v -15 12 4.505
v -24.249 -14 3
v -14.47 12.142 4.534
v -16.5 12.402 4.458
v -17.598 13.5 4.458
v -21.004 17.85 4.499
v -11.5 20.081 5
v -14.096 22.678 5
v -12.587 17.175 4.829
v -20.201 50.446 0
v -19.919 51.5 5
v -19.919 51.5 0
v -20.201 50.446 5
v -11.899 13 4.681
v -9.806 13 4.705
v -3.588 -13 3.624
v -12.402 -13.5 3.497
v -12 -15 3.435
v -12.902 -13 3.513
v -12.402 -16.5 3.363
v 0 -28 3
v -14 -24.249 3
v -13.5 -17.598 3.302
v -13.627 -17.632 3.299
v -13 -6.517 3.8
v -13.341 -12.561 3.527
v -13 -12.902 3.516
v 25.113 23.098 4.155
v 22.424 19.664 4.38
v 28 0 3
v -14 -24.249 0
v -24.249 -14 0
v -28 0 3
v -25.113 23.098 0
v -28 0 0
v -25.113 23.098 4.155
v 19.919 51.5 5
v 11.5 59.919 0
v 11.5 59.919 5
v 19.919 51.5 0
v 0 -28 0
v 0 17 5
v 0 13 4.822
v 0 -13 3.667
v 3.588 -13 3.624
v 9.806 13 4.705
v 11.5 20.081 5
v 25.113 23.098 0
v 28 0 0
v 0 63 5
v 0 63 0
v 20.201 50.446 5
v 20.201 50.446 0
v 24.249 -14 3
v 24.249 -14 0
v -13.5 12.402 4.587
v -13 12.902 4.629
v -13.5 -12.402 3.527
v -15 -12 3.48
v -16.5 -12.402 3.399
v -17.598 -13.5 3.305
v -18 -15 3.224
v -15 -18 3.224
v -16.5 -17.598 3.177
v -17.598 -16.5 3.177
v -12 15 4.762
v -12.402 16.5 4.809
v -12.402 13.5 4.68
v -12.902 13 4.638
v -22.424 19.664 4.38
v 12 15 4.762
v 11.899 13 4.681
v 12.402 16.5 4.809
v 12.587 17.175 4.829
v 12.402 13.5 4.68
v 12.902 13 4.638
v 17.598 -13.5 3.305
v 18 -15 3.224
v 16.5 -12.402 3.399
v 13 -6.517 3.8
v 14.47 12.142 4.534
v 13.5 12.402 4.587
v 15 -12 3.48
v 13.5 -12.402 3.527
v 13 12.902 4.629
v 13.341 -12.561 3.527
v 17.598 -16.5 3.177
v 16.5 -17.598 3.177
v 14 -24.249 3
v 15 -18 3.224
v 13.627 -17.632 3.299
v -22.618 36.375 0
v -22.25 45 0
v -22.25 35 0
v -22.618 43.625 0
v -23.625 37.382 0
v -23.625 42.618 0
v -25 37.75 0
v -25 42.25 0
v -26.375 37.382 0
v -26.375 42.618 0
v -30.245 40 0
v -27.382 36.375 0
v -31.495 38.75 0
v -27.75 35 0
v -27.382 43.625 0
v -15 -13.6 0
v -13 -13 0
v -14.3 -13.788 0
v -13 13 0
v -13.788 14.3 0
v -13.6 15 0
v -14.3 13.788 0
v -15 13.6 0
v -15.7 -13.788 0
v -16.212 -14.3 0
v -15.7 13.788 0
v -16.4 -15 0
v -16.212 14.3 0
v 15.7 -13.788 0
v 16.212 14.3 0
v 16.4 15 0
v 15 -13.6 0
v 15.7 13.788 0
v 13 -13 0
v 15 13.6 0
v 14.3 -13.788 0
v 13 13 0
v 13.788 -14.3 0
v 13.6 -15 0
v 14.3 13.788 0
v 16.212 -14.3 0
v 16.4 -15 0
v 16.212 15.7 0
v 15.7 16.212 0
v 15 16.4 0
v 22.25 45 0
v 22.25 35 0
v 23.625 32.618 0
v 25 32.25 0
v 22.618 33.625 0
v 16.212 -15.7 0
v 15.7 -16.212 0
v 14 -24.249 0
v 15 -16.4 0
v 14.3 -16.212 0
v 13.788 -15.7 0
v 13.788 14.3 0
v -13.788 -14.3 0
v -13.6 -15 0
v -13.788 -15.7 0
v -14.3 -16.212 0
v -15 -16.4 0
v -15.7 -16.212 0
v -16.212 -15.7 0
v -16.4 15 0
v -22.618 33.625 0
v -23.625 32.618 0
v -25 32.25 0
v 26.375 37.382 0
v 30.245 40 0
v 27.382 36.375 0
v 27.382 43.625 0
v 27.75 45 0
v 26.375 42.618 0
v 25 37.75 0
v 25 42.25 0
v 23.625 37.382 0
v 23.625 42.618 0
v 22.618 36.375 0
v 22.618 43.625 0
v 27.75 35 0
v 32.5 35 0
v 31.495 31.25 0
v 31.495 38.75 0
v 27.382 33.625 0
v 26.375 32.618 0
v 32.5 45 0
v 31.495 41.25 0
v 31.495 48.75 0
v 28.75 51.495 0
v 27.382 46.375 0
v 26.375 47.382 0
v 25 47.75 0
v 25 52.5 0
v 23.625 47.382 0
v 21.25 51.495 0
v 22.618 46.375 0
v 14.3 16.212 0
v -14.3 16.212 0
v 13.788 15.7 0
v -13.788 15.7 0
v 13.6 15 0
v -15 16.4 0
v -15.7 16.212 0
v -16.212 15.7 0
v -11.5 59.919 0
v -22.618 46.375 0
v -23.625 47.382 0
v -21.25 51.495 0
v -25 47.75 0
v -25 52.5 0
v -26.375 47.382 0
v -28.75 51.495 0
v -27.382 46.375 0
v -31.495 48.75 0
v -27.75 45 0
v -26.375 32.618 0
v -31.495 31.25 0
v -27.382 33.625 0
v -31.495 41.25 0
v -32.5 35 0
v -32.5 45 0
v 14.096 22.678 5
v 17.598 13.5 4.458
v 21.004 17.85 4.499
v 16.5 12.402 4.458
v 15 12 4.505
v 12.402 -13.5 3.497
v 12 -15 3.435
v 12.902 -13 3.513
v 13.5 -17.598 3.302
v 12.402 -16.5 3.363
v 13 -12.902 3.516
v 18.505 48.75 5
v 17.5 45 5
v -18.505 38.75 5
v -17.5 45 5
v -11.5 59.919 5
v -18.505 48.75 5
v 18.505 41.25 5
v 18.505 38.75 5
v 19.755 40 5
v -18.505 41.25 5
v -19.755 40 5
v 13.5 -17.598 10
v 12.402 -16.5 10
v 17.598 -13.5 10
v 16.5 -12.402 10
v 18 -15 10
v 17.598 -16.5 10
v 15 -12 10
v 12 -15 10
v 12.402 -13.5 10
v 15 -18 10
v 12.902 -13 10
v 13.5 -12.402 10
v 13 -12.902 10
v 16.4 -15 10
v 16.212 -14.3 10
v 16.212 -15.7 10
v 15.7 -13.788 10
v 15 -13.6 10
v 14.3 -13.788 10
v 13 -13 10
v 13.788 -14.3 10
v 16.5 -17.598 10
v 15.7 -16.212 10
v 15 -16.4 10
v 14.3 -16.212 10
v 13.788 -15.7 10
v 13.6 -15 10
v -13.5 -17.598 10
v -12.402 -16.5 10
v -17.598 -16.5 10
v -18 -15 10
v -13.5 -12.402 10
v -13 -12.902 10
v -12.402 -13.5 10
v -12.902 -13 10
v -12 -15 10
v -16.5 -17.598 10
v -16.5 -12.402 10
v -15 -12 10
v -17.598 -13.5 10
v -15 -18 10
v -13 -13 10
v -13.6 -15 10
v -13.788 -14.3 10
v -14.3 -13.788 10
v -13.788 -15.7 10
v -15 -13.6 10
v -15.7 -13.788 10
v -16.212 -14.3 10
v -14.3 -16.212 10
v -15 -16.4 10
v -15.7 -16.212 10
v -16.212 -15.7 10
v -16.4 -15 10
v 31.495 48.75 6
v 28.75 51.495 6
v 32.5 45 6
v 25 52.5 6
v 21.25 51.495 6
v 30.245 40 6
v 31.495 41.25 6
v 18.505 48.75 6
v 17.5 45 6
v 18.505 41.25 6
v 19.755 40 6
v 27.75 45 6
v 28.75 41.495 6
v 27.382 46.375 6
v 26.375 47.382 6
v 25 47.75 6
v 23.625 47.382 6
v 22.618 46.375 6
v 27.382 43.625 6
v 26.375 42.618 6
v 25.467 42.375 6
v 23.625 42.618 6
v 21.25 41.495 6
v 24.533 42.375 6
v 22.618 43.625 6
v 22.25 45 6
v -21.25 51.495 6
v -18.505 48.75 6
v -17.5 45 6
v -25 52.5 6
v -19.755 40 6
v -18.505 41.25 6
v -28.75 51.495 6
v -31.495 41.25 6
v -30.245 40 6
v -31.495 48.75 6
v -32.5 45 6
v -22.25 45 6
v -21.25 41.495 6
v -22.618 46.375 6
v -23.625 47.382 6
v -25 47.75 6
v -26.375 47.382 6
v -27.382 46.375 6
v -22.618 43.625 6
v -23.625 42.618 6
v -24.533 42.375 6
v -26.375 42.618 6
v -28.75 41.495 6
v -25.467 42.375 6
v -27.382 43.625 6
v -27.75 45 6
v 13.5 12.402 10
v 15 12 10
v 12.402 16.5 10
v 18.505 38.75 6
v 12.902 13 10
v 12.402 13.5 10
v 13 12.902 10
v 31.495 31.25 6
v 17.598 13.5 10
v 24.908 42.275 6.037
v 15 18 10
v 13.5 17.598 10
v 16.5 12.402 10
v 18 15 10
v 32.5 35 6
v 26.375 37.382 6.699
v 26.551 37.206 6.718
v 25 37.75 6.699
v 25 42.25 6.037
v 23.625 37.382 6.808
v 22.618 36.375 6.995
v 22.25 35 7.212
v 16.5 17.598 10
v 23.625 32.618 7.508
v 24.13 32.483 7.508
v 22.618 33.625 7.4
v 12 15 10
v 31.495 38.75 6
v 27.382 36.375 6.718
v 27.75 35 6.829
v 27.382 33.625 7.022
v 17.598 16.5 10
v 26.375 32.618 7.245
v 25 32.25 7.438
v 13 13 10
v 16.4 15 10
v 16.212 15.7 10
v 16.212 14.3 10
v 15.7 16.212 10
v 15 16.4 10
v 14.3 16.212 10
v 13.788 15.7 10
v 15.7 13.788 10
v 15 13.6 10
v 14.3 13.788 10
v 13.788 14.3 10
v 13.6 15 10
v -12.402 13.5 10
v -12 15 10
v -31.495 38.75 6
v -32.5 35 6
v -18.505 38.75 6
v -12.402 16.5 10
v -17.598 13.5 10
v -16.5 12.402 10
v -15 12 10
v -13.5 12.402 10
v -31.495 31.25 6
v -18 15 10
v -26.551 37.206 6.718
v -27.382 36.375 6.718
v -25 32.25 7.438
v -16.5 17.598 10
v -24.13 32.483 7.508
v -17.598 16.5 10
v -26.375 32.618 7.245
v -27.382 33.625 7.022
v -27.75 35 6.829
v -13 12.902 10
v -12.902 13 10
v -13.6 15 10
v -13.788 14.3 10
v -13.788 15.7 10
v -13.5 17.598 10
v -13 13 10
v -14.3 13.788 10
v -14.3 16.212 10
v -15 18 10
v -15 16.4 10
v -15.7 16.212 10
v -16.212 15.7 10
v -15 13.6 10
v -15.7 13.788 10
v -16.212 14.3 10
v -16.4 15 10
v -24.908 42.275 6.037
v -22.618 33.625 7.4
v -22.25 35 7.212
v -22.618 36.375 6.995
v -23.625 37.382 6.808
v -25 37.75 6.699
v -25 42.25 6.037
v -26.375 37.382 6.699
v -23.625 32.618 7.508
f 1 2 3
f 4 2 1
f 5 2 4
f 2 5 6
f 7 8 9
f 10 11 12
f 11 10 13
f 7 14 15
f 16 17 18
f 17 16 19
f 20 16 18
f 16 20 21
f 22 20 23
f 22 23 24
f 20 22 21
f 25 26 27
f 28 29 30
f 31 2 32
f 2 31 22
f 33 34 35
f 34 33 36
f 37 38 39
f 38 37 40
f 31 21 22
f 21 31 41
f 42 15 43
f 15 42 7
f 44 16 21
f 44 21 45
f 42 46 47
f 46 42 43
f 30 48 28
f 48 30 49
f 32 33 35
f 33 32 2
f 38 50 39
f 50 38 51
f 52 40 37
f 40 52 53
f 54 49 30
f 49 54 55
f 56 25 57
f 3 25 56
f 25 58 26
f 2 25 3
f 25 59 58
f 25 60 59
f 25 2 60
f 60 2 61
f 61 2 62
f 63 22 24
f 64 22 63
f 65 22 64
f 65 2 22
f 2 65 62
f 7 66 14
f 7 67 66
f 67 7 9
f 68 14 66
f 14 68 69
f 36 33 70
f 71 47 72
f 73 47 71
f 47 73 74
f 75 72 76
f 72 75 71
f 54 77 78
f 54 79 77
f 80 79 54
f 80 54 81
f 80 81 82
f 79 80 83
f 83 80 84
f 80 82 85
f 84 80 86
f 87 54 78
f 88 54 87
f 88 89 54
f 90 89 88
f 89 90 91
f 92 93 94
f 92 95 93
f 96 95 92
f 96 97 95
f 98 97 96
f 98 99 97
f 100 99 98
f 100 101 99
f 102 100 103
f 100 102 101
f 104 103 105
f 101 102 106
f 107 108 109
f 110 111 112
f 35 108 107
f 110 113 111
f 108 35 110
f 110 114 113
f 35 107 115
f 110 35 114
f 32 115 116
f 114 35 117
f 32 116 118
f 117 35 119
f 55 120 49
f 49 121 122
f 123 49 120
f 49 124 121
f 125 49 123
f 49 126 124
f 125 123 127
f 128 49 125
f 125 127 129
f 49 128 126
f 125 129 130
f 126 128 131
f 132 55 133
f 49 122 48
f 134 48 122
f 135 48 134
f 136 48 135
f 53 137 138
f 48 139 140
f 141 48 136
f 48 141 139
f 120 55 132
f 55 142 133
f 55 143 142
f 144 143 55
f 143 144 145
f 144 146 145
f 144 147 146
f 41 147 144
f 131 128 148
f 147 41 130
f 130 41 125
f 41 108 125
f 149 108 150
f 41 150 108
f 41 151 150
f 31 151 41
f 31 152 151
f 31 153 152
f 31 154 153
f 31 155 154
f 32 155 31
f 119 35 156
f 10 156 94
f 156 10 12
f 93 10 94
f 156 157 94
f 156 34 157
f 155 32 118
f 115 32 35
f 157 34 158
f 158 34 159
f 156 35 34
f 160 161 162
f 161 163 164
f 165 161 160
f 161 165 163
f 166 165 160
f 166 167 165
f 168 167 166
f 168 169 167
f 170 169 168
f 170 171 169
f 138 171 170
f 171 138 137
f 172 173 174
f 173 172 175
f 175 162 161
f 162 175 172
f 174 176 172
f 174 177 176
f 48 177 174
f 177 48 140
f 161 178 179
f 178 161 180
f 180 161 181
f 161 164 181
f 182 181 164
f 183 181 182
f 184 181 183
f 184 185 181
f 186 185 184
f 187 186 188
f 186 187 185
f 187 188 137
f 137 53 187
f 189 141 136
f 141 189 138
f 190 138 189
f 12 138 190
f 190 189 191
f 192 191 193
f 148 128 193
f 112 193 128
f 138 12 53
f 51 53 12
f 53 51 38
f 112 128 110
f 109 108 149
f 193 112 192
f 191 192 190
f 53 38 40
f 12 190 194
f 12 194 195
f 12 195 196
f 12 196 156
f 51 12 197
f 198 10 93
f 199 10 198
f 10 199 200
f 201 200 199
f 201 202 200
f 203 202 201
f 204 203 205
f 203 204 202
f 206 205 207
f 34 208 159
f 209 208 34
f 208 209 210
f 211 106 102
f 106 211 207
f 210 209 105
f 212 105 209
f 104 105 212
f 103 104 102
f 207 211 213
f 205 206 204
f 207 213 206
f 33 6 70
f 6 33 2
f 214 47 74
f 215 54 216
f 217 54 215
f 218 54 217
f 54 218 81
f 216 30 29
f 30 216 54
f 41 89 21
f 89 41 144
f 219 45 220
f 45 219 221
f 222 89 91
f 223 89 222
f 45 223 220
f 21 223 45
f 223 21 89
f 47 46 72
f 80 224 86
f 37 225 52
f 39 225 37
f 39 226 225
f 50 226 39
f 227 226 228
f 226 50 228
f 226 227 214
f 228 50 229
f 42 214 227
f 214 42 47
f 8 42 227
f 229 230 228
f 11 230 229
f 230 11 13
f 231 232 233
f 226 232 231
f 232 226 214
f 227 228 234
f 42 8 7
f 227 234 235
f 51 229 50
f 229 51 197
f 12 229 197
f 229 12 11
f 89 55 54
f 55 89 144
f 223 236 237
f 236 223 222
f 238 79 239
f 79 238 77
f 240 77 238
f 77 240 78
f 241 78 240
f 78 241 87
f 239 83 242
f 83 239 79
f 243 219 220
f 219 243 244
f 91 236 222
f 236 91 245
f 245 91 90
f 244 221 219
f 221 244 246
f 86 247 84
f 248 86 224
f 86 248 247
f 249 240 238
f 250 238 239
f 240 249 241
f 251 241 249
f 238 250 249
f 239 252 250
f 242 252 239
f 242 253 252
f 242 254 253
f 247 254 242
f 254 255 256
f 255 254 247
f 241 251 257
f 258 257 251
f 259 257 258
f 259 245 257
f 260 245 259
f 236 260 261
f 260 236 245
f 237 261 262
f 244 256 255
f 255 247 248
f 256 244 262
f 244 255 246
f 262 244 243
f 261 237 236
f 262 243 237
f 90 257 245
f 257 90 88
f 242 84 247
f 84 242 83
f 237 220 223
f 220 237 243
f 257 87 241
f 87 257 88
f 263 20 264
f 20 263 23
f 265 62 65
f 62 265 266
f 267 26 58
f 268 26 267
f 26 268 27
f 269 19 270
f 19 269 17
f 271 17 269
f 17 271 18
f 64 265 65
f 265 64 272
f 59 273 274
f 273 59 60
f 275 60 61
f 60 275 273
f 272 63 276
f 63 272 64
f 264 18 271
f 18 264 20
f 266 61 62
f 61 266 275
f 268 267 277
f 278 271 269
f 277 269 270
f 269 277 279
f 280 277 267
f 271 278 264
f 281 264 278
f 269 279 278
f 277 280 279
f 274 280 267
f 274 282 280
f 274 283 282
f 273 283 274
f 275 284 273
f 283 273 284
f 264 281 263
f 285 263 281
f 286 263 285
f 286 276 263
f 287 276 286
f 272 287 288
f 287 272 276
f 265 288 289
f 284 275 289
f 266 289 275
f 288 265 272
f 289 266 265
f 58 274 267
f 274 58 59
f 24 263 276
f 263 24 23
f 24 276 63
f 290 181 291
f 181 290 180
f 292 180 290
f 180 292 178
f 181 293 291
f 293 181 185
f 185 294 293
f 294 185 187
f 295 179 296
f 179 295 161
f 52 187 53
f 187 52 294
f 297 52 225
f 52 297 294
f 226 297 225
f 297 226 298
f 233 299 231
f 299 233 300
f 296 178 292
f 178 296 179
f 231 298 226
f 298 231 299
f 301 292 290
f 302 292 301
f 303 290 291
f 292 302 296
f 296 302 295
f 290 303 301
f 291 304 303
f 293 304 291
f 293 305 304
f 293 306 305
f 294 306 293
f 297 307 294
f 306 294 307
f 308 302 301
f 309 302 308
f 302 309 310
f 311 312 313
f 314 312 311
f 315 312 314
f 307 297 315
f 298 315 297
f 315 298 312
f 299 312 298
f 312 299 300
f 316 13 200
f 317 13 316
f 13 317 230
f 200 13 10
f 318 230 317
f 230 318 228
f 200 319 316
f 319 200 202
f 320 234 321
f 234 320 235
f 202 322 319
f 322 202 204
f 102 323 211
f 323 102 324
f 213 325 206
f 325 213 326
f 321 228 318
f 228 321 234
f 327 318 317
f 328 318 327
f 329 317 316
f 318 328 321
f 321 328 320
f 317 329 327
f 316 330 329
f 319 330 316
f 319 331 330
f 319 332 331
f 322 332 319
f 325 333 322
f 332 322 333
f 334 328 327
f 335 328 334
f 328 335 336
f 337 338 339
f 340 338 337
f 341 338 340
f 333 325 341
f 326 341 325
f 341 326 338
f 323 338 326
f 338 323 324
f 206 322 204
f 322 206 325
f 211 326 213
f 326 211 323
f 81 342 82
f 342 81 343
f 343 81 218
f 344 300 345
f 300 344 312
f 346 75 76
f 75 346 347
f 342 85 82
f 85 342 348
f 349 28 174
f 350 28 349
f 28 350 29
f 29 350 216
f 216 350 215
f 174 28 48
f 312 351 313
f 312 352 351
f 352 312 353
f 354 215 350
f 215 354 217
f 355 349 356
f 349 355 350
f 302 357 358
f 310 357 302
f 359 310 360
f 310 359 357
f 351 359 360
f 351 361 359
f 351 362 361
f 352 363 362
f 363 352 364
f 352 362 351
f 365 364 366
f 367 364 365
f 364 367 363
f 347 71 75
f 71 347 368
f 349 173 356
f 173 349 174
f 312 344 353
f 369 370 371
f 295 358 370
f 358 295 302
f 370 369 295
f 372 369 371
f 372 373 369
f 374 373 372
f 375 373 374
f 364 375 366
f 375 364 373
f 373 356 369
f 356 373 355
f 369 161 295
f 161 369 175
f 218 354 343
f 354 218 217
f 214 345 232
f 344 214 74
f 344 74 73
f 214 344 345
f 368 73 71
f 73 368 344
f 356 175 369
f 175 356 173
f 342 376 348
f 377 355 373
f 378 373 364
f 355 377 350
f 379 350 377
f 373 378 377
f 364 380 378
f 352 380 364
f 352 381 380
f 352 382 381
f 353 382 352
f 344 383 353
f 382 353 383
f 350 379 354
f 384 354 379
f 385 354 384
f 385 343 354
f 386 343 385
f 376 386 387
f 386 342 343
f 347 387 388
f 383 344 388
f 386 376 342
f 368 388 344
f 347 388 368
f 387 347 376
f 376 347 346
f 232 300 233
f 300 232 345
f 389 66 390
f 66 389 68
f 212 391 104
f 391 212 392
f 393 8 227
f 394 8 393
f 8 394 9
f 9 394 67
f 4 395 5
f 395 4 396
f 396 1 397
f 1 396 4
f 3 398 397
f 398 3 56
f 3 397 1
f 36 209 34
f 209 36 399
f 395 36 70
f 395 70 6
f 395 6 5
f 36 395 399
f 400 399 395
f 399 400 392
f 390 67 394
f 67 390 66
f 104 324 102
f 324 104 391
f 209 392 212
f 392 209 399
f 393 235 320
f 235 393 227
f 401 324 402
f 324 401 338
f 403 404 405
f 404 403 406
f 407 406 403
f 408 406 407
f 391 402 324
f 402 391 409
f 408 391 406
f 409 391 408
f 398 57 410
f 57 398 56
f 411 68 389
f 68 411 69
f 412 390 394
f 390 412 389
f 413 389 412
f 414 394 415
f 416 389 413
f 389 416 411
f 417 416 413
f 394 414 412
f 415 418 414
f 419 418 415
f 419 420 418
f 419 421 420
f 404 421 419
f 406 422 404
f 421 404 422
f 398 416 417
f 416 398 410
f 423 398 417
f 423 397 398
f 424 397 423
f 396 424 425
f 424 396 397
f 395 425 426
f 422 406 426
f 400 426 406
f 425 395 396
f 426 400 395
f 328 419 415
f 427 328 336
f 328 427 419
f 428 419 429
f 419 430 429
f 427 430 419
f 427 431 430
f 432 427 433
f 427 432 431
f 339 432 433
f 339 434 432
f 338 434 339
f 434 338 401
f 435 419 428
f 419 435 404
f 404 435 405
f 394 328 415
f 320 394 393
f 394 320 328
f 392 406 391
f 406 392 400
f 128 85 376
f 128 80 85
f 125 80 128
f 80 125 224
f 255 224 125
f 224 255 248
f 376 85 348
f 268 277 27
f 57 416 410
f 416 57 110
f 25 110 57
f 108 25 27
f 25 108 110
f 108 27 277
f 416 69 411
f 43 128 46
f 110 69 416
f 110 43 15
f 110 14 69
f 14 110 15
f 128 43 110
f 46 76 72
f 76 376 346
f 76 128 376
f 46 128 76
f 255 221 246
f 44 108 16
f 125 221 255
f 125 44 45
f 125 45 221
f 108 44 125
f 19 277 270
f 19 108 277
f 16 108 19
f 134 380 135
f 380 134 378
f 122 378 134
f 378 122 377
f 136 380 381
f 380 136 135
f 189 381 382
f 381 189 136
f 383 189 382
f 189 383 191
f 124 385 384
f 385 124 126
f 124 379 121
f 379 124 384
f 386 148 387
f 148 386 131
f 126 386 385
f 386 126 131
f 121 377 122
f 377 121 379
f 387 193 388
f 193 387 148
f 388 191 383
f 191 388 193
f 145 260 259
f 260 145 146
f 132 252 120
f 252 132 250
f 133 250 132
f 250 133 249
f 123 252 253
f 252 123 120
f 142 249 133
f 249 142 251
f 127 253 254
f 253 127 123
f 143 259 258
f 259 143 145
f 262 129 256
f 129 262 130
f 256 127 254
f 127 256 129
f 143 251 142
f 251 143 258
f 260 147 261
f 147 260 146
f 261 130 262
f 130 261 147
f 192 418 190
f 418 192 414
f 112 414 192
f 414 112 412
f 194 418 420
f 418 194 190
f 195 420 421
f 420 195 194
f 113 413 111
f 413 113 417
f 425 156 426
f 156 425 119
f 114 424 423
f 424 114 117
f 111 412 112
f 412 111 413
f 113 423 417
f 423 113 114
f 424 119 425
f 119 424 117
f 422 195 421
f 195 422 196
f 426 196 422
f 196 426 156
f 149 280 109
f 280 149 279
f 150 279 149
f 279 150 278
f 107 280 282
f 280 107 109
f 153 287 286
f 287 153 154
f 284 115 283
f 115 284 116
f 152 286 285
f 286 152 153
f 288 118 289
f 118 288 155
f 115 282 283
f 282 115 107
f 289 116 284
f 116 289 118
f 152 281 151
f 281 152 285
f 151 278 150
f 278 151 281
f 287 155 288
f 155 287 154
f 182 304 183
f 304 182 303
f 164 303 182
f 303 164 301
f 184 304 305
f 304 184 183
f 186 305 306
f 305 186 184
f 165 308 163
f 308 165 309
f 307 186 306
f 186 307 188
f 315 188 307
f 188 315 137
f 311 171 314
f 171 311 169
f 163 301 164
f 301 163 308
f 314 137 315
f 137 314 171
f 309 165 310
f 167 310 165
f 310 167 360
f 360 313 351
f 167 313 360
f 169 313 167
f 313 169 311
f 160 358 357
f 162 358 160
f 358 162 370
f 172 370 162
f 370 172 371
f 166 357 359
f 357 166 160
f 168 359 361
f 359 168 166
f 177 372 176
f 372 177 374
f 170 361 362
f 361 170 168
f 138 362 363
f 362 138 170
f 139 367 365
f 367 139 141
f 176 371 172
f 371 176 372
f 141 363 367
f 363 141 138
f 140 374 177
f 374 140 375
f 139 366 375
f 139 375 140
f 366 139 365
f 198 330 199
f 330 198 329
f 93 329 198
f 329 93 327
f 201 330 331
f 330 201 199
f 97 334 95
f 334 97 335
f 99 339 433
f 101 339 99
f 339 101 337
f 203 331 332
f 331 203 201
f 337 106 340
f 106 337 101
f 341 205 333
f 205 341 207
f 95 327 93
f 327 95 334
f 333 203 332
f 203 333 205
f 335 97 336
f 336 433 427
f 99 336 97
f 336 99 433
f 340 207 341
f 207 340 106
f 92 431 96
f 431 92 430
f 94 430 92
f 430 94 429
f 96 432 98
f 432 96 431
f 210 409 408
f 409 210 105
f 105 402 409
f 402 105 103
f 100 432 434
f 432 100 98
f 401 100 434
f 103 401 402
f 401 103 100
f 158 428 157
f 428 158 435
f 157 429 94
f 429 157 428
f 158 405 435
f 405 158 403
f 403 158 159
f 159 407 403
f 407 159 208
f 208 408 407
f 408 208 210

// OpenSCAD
//This camera mount is to go on the back of either V2 or HQ raspberry pi camera module.
//The mounting is from the back to allow modification (e.g. different lenses) to the front
//it's pretty crude and simple but is intended to be a drop-in module for more complex systems e.g. darkfield illumination system to measure light scattering from cells in microdevices.


//parameters varibales and spacing
lugy=5;
lugx=25;
ymount=40;
$fn=12;
    // HQ holes are 4mm from edge of 38mm square; i.e. 38/2-4 mm from centrepoint 19-4=15mm 
HQmount=15;

//LUGS for camera v2 board
module lugs(){
difference(){
hull(){
translate([10.4,0,0]) cylinder(d=4,h=10);
translate([20,0,0]) cylinder(d=8,h=4);
}
translate([10.4,0,-50]) cylinder(d=2,h=100);
}
}
    
module boardmount2(depth=4,pi2=true) {
union(){
//FIRST LUGS FOR CAMERA v2 BOARD has 2.2mm mounting holes; can comment out for HQ camera
if(pi2){

lugs();
mirror([1,0,0]){
    lugs();
}
}
//THEN PLATE FOR MOUNTING
difference(){
union(){
    //base plate (can be various shapes)
hull(){
translate([0,0,0]) cylinder(d=56,h=3);
translate([0,ymount,0]) cylinder(d=46,h=5);
}

//add first pair lugs for HQ camera    
translate([HQmount,-HQmount,0]) cylinder(d=6,h=10);
translate([-HQmount,-HQmount,0]) cylinder(d=6  ,h=10);  
    
//add lugs for mounting
    // lugx and lugy grid for mounts
//offset from core by ymount


translate([lugx,lugy+ymount,0]) cylinder(d=15,h=6);
translate([-lugx,lugy+ymount,0]) cylinder(d=15,h=6);

//paired lugs
hull(){
translate([HQmount,HQmount,0]) cylinder(d=6,h=10);
translate([lugx,-lugy+ymount,0]) cylinder(d=15,h=6);
}
hull(){
translate([-HQmount,HQmount,0]) cylinder(d=6,h=10);
translate([-lugx,-lugy+ymount,0]) cylinder(d=15,h=6);  
}

}


translate([-13,-13,-50]) cube([26,26,100]); //space for camera
    //ADD 2.8mm HOLES FOR HQ camera- PCB has 2.5mm mounting holes 
translate([HQmount,HQmount,-50]) cylinder(d=2.8,h=100);
translate([HQmount,-HQmount,-50]) cylinder(d=2.8,h=100);
translate([-HQmount,HQmount,-50]) cylinder(d=2.8,h=100);
translate([-HQmount,-HQmount,-50]) cylinder(d=2.8,h=100);

    //ADD 5.5mm HOLES FOR mounting with M5 t-nut bolts
translate([lugx,lugy+ymount,-50]) cylinder(d=5.5,h=100);
translate([lugx,-lugy+ymount,-50]) cylinder(d=5.5,h=100);
translate([-lugx,lugy+ymount,-50]) cylinder(d=5.5,h=100);
translate([-lugx,-lugy+ymount,-50]) cylinder(d=5.5,h=100);


}
}

}

//Bolt check
//translate([-HQmount,-HQmount,-50]) cylinder(r=1,h=100,$fn=120);


//boardmount2(); 
boardmount2(pi2=false);
